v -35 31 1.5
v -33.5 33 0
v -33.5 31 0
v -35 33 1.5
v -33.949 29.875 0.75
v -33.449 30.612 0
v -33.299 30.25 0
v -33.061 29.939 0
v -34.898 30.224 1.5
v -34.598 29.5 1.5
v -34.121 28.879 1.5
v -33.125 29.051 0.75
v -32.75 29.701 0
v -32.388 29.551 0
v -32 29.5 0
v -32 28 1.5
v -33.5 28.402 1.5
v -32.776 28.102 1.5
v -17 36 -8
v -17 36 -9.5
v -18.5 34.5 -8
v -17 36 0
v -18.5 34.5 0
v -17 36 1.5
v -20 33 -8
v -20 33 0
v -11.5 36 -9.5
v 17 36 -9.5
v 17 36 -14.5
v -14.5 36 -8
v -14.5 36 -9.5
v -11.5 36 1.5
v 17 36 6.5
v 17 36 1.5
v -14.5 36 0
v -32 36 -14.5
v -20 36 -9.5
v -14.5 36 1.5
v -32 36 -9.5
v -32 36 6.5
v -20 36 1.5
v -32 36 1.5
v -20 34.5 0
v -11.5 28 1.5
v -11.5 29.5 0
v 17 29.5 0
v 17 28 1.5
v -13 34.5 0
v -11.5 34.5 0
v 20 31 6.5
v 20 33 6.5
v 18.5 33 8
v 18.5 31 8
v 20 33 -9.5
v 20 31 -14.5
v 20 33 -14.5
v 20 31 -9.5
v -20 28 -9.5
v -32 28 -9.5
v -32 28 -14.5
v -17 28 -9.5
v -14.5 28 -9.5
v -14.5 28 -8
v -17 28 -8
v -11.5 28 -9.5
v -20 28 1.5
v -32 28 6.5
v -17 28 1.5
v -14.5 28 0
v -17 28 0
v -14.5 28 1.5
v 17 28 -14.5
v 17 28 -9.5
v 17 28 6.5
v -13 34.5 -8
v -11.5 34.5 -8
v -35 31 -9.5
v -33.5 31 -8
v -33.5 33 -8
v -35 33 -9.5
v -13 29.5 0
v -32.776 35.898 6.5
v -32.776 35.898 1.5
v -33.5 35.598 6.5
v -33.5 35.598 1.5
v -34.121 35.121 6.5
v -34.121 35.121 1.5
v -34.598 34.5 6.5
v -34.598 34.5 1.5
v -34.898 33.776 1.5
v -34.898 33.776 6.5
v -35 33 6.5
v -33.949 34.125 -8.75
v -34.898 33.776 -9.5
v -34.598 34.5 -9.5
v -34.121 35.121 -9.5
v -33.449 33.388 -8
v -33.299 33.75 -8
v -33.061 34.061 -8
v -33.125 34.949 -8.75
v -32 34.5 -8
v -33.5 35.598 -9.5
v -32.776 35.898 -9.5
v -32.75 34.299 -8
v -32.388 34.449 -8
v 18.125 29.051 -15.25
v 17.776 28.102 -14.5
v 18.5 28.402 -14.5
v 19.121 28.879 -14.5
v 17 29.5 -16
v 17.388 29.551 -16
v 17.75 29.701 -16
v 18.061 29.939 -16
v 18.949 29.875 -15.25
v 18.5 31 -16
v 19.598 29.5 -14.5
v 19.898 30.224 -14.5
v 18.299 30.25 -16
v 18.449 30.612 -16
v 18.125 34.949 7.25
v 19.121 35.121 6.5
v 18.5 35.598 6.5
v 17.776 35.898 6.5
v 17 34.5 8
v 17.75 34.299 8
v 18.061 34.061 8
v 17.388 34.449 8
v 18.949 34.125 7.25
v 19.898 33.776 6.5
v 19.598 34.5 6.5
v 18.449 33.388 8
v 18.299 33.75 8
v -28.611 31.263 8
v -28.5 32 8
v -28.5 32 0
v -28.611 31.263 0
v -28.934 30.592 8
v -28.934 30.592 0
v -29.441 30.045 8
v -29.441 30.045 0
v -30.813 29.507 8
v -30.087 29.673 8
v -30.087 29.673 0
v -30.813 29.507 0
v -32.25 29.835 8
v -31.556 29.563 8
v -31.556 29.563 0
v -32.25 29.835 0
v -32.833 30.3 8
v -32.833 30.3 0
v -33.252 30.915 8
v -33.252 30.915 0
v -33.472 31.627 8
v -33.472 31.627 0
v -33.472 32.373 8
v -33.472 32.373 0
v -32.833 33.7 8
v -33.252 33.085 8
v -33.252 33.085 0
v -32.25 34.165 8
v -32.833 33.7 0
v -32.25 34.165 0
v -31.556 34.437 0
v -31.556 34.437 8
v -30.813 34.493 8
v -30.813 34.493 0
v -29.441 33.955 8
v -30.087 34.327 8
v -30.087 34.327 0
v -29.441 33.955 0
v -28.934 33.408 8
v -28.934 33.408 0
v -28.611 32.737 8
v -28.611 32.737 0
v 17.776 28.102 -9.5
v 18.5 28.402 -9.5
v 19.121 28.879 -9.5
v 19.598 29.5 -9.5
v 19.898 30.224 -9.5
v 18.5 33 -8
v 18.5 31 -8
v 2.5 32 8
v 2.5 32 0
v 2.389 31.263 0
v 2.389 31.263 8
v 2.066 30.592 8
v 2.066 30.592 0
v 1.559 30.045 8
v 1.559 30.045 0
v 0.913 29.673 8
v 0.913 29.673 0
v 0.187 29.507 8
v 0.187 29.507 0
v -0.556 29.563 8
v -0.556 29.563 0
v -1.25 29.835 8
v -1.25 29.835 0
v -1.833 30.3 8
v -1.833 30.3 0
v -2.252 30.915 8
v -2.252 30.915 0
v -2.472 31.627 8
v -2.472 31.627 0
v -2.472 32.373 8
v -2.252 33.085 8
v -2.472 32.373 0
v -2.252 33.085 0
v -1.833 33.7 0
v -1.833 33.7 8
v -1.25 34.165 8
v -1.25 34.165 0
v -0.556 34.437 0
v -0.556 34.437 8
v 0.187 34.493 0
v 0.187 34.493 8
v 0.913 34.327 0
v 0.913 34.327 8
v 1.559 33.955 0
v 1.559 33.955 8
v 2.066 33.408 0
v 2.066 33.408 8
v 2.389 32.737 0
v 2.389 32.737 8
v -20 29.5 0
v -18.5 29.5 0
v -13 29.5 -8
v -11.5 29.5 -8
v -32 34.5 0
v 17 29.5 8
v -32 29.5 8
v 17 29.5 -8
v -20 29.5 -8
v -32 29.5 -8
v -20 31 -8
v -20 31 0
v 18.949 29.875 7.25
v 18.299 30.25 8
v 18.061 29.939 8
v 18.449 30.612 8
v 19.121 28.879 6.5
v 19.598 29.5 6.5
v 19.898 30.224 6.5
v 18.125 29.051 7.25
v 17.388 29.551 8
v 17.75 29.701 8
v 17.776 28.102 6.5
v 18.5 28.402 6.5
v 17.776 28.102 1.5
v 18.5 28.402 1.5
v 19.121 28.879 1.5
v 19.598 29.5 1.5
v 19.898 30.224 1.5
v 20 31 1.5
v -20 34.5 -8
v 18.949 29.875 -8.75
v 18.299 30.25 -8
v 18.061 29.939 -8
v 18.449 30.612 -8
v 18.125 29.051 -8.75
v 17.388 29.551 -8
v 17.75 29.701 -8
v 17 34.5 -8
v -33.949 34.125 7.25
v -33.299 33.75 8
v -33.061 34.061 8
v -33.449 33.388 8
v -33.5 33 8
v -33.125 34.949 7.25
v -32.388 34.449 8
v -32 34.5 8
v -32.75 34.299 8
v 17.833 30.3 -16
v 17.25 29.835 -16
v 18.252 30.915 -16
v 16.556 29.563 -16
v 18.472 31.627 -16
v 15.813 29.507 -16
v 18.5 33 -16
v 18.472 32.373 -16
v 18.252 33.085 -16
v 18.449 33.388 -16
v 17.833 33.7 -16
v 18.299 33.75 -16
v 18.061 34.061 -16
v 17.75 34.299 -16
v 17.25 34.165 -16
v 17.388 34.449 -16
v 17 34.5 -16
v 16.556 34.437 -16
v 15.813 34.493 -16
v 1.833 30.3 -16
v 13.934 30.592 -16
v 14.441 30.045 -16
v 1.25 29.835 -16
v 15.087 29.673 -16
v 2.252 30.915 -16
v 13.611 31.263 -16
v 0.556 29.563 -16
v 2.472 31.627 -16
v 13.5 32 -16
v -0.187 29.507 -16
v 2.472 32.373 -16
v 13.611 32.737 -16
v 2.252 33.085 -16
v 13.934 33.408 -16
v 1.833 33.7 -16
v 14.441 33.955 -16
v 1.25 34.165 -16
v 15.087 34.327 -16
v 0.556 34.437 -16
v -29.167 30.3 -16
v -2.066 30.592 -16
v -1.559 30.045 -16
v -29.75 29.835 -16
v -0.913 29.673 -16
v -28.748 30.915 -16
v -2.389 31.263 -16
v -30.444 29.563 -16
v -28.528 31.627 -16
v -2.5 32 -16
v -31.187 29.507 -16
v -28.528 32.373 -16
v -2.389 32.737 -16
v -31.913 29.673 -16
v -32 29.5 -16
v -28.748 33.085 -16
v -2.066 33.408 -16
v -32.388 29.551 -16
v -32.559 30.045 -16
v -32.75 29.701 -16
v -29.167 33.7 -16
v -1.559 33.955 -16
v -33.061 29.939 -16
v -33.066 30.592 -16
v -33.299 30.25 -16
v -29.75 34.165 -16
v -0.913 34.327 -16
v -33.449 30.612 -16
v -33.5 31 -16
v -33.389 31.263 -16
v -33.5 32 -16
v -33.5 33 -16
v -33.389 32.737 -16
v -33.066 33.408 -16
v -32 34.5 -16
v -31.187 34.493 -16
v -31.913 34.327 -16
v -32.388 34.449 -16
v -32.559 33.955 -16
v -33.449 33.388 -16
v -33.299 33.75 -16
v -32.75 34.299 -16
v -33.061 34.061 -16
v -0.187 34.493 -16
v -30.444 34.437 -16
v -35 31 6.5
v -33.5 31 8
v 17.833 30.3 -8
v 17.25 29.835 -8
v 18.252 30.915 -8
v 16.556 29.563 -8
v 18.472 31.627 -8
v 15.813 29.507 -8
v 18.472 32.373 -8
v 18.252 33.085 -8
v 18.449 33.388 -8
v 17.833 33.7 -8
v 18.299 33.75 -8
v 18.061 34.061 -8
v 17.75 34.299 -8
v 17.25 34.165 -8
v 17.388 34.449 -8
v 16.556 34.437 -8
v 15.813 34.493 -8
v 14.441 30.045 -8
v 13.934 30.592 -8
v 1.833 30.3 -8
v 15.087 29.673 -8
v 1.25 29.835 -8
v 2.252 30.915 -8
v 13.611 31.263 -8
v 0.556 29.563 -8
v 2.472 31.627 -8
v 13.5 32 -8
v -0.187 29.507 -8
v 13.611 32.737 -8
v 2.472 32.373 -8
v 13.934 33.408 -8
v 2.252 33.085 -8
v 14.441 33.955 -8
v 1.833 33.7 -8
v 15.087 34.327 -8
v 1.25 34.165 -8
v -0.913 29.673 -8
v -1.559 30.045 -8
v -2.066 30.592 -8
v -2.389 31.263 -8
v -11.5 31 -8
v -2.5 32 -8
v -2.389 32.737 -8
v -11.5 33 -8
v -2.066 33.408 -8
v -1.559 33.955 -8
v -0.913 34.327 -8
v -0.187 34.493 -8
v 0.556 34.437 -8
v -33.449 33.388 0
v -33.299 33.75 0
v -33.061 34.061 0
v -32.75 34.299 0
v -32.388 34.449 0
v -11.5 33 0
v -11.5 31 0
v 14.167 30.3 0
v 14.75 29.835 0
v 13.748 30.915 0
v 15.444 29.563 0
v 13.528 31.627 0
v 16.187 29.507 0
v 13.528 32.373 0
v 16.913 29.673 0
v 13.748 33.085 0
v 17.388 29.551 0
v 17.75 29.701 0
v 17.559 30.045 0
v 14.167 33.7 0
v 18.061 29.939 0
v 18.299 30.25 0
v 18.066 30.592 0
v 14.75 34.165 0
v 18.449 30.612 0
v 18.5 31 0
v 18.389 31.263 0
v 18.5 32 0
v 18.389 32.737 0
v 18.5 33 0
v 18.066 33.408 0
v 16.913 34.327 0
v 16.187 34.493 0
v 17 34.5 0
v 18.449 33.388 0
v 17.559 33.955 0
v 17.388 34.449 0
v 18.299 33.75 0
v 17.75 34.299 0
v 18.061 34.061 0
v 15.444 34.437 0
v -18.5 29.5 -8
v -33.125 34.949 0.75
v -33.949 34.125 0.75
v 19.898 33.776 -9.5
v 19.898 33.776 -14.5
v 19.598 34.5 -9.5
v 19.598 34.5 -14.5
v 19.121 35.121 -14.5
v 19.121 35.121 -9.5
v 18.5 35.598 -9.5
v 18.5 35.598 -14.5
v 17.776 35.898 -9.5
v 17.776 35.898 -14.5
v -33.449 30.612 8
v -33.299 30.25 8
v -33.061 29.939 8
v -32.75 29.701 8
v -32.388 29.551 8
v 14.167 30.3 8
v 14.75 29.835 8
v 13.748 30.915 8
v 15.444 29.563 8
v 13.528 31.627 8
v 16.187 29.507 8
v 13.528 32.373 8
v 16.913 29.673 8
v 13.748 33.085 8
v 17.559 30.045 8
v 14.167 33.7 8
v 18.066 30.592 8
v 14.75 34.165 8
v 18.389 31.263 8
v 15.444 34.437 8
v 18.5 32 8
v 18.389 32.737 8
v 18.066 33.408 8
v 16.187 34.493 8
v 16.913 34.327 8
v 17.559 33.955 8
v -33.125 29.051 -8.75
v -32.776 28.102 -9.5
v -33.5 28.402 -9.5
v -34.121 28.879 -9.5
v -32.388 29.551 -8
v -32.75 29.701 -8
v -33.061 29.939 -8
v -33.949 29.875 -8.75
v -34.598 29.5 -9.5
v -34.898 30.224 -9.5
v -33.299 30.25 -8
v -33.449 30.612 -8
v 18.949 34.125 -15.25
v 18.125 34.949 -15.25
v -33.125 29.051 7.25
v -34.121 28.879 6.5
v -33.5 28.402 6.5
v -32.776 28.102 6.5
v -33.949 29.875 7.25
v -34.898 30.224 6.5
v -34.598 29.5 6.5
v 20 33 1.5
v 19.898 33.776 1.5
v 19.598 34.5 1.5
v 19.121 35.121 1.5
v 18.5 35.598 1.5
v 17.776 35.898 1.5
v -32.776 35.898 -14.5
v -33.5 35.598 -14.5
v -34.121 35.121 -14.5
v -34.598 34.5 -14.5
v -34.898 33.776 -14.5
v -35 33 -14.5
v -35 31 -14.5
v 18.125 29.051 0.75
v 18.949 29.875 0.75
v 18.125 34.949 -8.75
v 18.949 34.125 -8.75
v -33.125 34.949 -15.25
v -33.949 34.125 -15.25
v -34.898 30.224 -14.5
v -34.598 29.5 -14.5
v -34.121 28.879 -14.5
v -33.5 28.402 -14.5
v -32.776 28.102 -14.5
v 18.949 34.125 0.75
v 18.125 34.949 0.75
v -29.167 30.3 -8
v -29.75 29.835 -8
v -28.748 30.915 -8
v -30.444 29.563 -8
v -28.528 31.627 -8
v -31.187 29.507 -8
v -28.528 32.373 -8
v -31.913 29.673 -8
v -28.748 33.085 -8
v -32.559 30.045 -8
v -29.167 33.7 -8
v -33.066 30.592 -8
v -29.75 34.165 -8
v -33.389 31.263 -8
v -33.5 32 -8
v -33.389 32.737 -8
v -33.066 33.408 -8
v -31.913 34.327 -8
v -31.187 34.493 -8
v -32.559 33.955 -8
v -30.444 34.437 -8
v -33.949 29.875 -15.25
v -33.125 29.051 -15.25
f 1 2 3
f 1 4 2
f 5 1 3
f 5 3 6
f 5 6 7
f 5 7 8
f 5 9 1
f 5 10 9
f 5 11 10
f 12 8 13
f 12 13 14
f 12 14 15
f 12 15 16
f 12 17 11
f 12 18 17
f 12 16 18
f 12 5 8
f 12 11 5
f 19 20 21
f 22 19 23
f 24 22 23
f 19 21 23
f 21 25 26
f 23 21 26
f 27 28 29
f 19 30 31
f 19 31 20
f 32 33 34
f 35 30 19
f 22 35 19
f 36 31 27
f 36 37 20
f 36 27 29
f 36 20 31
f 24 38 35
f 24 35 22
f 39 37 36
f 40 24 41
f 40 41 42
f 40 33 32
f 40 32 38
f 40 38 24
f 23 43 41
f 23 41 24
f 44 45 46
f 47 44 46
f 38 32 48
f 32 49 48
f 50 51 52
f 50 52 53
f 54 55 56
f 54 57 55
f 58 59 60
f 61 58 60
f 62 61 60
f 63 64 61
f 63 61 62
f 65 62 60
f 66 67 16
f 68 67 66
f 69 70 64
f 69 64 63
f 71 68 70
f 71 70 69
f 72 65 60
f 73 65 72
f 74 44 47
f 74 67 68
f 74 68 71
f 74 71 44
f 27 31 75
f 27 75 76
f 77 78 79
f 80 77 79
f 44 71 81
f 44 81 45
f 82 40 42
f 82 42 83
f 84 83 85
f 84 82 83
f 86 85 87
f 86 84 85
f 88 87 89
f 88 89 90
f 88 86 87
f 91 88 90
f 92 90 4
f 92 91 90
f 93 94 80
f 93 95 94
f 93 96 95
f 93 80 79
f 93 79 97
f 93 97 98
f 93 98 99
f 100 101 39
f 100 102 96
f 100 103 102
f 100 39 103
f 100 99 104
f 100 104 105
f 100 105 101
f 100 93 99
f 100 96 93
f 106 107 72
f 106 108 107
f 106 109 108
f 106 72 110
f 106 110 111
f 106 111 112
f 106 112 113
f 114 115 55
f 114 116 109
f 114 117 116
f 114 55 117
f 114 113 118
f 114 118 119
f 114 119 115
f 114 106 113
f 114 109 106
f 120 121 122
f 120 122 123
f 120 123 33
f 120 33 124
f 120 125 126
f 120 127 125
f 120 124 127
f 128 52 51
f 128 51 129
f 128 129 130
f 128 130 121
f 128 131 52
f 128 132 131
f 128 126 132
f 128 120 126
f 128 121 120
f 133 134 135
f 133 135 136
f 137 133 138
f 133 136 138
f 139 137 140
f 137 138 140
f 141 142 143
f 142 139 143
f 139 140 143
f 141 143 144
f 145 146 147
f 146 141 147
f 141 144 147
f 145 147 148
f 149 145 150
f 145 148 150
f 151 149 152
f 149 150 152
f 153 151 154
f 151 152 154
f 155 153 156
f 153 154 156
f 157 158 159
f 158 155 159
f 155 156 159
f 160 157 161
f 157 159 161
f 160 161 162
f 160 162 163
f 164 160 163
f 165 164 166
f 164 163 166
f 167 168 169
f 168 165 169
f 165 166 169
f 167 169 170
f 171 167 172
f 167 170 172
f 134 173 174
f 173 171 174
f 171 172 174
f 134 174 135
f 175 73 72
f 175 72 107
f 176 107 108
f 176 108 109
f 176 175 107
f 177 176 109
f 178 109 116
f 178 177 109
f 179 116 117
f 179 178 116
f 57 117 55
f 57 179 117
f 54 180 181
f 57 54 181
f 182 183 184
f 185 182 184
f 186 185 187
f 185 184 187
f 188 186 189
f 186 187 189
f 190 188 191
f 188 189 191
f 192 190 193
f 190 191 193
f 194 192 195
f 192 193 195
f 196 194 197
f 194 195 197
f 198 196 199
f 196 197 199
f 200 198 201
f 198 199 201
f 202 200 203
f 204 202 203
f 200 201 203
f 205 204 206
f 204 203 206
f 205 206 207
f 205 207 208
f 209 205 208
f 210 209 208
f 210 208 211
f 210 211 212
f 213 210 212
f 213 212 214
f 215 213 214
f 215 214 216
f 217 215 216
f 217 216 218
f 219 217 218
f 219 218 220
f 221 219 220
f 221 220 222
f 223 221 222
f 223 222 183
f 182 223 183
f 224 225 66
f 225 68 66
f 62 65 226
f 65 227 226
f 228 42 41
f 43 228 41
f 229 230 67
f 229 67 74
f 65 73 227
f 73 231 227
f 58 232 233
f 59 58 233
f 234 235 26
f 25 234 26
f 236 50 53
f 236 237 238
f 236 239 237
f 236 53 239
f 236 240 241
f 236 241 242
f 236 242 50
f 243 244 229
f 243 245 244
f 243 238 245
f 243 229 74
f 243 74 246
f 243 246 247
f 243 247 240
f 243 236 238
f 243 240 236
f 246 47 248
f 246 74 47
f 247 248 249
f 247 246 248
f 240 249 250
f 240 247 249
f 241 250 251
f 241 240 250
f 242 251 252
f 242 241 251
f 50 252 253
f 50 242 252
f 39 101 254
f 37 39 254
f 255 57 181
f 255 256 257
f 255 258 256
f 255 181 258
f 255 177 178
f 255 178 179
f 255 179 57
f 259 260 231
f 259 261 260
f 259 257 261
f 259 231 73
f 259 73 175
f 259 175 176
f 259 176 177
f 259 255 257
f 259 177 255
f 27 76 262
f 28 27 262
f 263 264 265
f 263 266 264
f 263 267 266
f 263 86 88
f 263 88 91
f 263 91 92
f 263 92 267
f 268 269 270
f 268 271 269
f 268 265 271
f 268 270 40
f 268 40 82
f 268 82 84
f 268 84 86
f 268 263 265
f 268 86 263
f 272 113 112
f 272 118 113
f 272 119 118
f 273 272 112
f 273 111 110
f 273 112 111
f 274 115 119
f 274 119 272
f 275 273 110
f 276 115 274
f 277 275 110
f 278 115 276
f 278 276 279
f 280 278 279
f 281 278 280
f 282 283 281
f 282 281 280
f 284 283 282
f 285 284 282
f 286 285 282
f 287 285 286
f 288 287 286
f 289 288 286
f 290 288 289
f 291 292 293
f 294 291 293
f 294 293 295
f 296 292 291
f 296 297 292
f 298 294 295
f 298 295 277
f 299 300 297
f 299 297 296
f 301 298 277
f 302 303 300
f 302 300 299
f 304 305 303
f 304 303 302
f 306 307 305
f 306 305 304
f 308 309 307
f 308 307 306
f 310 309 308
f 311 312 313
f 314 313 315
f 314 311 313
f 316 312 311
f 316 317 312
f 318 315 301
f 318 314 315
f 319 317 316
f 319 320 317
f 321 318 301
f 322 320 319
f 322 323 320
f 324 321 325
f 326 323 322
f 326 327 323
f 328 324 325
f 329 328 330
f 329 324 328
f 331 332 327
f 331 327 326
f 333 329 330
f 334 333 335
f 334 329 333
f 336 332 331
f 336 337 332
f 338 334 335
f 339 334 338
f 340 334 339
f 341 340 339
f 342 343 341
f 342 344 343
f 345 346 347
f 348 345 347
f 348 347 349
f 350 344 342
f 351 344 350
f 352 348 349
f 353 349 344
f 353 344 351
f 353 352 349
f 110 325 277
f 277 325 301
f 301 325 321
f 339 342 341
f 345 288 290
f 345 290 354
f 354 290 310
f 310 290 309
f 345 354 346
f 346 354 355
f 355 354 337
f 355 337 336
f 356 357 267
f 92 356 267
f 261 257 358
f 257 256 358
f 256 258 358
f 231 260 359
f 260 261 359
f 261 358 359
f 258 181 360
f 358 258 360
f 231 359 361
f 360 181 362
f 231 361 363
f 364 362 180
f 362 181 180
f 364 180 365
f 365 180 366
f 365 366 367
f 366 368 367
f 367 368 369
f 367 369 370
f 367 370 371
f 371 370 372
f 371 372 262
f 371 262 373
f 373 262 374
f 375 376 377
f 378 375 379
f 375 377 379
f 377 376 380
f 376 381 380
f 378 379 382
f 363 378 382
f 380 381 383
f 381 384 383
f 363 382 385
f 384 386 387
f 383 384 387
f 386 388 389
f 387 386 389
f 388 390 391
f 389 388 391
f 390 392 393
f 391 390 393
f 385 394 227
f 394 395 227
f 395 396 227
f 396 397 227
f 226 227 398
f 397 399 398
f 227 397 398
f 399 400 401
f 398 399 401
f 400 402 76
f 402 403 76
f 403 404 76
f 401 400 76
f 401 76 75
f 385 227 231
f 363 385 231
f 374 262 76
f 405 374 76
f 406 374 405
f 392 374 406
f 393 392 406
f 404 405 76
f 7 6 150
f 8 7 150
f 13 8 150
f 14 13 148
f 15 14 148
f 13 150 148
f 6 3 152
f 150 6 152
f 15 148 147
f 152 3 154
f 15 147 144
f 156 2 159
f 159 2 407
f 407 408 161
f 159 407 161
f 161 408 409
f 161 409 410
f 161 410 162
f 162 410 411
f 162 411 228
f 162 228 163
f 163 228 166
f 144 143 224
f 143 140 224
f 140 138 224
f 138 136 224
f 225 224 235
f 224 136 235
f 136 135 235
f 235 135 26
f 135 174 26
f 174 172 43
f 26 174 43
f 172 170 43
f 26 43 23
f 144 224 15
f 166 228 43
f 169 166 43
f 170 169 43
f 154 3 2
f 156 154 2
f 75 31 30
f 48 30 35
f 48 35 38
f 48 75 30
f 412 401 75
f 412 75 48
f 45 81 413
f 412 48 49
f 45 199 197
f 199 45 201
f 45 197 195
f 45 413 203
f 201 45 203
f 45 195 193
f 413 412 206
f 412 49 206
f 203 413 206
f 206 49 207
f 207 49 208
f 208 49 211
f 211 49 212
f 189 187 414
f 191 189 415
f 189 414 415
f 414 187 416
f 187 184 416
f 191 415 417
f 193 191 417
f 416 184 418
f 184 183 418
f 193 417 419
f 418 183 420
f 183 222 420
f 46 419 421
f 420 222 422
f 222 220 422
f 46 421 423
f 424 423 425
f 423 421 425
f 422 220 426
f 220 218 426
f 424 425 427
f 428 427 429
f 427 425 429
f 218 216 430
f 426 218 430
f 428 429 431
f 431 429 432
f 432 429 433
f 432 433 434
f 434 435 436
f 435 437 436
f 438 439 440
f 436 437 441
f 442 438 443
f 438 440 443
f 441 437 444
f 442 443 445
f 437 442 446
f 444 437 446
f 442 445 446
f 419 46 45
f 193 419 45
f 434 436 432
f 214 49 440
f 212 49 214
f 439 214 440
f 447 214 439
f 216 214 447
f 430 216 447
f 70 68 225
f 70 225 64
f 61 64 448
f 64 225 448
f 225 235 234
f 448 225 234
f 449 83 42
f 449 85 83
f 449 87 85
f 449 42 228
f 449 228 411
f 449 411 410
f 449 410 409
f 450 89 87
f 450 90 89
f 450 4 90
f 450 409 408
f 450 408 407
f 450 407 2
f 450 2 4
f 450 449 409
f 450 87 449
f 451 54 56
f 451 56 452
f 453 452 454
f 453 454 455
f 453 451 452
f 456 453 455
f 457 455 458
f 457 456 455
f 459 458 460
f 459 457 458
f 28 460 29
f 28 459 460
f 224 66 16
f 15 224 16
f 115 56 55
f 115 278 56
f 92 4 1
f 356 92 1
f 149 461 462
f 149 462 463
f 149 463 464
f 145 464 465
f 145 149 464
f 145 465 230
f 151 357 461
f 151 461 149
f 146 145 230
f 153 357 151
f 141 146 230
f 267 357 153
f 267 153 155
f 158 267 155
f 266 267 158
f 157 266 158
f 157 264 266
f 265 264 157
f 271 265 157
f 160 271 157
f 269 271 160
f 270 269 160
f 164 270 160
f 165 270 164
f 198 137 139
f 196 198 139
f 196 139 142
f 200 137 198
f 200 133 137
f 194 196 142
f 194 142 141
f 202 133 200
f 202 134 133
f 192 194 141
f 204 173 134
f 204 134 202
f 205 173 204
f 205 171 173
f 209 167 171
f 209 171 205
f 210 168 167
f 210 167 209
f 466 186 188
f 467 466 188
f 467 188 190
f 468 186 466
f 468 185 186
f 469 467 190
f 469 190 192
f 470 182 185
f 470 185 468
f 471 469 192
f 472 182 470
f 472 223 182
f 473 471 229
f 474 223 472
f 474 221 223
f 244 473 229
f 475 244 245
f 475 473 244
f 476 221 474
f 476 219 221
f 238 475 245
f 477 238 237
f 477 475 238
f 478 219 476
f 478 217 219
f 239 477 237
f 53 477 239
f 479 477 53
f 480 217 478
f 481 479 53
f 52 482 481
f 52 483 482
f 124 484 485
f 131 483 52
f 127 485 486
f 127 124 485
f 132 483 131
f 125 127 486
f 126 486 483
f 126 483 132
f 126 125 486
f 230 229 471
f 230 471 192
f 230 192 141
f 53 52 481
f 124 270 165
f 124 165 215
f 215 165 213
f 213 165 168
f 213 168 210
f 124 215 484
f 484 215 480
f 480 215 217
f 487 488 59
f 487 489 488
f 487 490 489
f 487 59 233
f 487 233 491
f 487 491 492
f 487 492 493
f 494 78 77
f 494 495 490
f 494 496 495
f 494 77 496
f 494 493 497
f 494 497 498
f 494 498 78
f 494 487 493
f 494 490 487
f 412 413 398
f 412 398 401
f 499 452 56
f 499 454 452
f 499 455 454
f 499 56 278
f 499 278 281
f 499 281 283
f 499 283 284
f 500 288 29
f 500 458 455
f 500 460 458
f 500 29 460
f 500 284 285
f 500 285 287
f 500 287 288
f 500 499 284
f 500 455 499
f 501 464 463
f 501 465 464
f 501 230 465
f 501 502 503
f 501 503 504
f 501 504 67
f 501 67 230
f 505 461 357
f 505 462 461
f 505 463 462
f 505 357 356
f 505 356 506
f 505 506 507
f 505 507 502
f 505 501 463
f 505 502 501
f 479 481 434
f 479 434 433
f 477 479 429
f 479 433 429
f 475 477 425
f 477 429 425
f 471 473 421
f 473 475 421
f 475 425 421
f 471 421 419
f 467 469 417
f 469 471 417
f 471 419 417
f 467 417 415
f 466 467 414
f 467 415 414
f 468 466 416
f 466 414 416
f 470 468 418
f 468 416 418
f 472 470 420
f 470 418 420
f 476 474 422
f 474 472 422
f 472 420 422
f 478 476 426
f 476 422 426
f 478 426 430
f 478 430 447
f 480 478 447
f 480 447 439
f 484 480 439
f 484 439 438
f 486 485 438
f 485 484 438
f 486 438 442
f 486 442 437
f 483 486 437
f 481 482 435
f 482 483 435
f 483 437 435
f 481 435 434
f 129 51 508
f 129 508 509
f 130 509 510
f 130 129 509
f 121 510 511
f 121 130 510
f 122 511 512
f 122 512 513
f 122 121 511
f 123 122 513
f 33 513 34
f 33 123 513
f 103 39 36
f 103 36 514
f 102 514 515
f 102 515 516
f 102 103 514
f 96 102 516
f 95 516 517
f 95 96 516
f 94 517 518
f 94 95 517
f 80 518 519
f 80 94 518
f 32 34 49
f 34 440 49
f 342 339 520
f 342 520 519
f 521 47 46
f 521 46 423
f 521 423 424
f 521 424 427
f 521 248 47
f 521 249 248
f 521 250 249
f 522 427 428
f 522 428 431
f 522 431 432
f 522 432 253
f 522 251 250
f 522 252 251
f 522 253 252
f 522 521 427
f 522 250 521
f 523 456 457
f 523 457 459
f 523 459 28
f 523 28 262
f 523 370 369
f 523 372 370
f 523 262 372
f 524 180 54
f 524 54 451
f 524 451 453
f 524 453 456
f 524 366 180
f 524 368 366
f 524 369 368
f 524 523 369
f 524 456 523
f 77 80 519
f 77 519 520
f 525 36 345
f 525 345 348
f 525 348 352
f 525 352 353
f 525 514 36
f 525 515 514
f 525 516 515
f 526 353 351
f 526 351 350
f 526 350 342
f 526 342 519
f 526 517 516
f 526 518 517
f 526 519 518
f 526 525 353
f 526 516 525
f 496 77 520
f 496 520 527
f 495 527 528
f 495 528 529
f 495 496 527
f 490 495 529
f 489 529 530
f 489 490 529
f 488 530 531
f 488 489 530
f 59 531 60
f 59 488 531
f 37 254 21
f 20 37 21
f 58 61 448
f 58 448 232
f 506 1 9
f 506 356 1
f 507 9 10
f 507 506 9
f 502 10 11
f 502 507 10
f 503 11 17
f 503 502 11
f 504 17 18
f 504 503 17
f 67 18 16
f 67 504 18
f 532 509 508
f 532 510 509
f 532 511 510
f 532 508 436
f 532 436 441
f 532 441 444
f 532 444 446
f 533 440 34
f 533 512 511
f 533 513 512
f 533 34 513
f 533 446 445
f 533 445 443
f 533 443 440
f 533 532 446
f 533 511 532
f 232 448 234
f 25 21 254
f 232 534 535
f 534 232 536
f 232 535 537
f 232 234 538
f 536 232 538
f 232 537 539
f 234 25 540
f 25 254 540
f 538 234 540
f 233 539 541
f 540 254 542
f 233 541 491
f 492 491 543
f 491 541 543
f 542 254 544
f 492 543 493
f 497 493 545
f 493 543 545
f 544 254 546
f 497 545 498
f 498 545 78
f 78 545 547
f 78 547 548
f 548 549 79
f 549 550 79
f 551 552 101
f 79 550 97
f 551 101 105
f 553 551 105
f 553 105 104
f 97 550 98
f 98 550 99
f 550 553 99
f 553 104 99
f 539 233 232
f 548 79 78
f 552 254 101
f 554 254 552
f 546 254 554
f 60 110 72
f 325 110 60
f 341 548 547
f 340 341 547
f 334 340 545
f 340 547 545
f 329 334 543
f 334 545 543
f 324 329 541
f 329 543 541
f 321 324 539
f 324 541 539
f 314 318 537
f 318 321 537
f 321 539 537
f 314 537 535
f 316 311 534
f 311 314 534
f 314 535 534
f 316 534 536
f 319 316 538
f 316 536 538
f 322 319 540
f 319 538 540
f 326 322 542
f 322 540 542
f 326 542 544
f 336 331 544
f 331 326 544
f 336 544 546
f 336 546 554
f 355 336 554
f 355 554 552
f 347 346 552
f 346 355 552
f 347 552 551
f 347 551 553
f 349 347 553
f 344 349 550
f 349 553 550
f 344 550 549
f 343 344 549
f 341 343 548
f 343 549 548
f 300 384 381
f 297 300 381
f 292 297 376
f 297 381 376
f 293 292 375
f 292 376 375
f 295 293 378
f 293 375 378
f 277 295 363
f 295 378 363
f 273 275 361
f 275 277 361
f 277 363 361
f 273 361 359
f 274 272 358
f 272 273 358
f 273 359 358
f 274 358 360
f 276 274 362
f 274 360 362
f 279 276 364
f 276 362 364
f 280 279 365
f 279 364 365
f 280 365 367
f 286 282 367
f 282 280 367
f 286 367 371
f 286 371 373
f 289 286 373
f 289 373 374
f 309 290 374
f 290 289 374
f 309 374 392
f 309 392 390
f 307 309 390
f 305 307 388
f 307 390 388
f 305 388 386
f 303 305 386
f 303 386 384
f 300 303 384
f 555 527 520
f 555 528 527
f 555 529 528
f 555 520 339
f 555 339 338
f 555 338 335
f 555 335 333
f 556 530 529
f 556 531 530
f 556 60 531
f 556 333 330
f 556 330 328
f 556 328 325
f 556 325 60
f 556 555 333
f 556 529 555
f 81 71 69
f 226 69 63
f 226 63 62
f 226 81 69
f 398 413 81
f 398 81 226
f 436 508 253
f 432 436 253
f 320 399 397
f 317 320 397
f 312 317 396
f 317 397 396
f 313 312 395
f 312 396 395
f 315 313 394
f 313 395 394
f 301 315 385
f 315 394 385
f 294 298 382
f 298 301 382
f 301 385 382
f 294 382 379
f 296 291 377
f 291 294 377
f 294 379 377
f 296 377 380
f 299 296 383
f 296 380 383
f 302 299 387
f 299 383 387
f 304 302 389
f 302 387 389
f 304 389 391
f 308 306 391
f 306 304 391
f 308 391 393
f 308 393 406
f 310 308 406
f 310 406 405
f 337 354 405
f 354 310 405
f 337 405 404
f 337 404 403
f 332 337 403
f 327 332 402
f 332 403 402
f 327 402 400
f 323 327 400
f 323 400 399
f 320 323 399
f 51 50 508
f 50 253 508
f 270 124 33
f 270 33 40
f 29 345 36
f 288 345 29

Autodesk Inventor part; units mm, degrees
ref_plane "YZ Plane" through (0, 0, 0) normal (1, 0, 0) x (0, 1, 0)
ref_plane "XZ Plane" through (0, 0, 0) normal (0, 1, 0) x (-1, 0, 0)
ref_plane "XY Plane" through (0, 0, 0) normal (0, 0, 1) x (1, 0, 0)
sketch "Sketch1" plane through (0, 0, 0) normal (0, 0, 1) x (1, 0, 0)
  line L0 (20, 36) -> (-35, 36)
  line L1 (-35, 36) -> (-35, 28)
  line L2 (-35, 28) -> (20, 28)
  line L3 (20, 28) -> (20, 36)
  circle A0 centre (16, 32) radius 2.5
  circle A1 centre (-31, 32) radius 2.5
  arc A2 (-2.5, 32) -> (2.5, 32) centre (0, 32) ccw projected
  line L4 (-2.5, 32) -> (-2.5, -32) projected
  line L5 (2.5, -32) -> (2.5, 32) projected
  arc A3 (2.5, -32) -> (-2.5, -32) centre (0, -32) ccw projected
  arc A4 (0, 34.5) -> (-2.5, 32) centre (0, 32) ccw projected
  arc A5 (2.5, 32) -> (0, 34.5) centre (0, 32) ccw projected
  point P0 (0, 0)
  point P1 (-2.5, 28)
  point P2 (2.5, 28)
  dimension "d0" = 8
  dimension "d2" = 55
  dimension "d4" = 4
  dimension "d5" = 4
  dimension "d7" = 4
  dimension "d11" = 5
extrude "Extrusion1" add sketch "Sketch1" along normal blind 8 contours L3 L2 L5 A5 A4 L4 L1 L0 | L2 L4 A2 L5
fillet "Fillet1" radius 3 4 edges at (-35, 36, 4) (-35, 28, 4) (20, 28, 4) (20, 36, 4)
sketch "Sketch2" plane through (0, 0, 0) normal (0, 0, -1) x (-1, 0, 0)
  arc A0 (-17, 36) -> (-20, 33) centre (-17, 33) ccw projected
  line L0 (-20, 31) -> (-20, 33) projected
  arc A1 (-20, 31) -> (-17, 28) centre (-17, 31) ccw projected
  line L1 (32, 28) -> (-17, 28) projected
  arc A2 (32, 28) -> (35, 31) centre (32, 31) ccw projected
  line L2 (35, 33) -> (35, 31) projected
  arc A3 (35, 33) -> (32, 36) centre (32, 33) ccw projected
  line L3 (-17, 36) -> (32, 36) projected
  line L4 (20, 36) -> (32, 36)
  line L5 (32, 28) -> (20, 28)
  line L6 (20, 28) -> (20, 36)
  line L7 (32, 28) -> (-17, 28) projected
  line L8 (11.5, 36) -> (19.5, 36)
  line L9 (19.5, 36) -> (19.5, 28)
  line L10 (19.5, 28) -> (11.5, 28)
  line L11 (11.5, 28) -> (11.5, 36)
  point P0 (0, 0)
  dimension "d12" = 15
  dimension "d21" = 8
extrude "Extrusion2" add sketch "Sketch2" along normal blind 8 contours L3 L9 L1 L11 | L3 L6 L1 L9
sketch "Sketch3" plane through (0, 0, -8) normal (0, 0, -1) x (-1, 0, 0)
  line L0 (-17, 36) -> (11.5, 36) projected
  arc A0 (-17, 36) -> (-20, 33) centre (-17, 33) ccw projected
  line L1 (-20, 31) -> (-20, 33) projected
  arc A1 (-20, 31) -> (-17, 28) centre (-17, 31) ccw projected
  line L2 (32, 28) -> (19.5, 28) projected
  circle A2 centre (0, 32) radius 2.5 projected
  circle A3 centre (-16, 32) radius 2.5 projected
  line L3 (20, 36) -> (11.5, 36) projected
  line L4 (19.5, 36) -> (19.5, 28) projected
  arc A4 (32, 28) -> (35, 31) centre (32, 31) ccw projected
  line L5 (35, 33) -> (35, 31) projected
  arc A5 (35, 33) -> (32, 36) centre (32, 33) ccw projected
  line L6 (19.5, 36) -> (32, 36) projected
  line L7 (11.5, 28) -> (11.5, 36) projected
  line L8 (11.5, 28) -> (-17, 28) projected
  circle A6 centre (31, 32) radius 2.5 projected
  line L9 (11.5, 28) -> (20, 28) projected
  line L10 (20, 28) -> (20, 36) projected
  line L11 (11.5, 36) -> (11.5, 28) projected
  point P0 (0, 0)
  point P1 (-17, 36)
extrude "Extrusion3" add sketch "Sketch3" along normal blind 8
chamfer "Chamfer1" distance 3 angle 45 4 edges at (-11.5, 36, -4) (-20, 36, -4) (-20, 28, -4) (-11.5, 28, -4)
chamfer "Chamfer2" distance 1.5 angle 45 44 edges at (-13, 36, 0) (2.75, 36, 0) (19.1213, 35.1213, 0) (20, 32, 0) (19.1213, 28.8787, 0) (-18.5, 28, 0) (2.75, 28, 0) (-13, 28, 0) (-18.5, 36, 0) (-26, 36, 0) (-34.1213, 35.1213, 0) (-35, 32, 0) (-34.1213, 28.8787, 0) (-26, 28, 0) (-18.5, 36, -8) (-26, 36, -8) (-13, 36, -8) (-34.1213, 35.1213, -8) (-35, 32, -8) (-34.1213, 28.8787, -8) (-18.5, 28, -8) (-26, 28, -8) (-13, 28, -8) (2.75, 36, -8) (19.1213, 35.1213, -8) (20, 32, -8) (19.1213, 28.8787, -8) (2.75, 28, -8) (-7.5, 36, -16) (19.1213, 35.1213, -16) (20, 32, -16) (19.1213, 28.8787, -16) (-7.5, 28, -16) (-34.1213, 28.8787, -16) (-35, 32, -16) (-34.1213, 35.1213, -16) (-7.5, 36, 8) (-34.1213, 35.1213, 8) (-35, 32, 8) (-34.1213, 28.8787, 8) (-7.5, 28, 8) (19.1213, 28.8787, 8) (20, 32, 8) (19.1213, 35.1213, 8)
properties part number "cross-beam"
